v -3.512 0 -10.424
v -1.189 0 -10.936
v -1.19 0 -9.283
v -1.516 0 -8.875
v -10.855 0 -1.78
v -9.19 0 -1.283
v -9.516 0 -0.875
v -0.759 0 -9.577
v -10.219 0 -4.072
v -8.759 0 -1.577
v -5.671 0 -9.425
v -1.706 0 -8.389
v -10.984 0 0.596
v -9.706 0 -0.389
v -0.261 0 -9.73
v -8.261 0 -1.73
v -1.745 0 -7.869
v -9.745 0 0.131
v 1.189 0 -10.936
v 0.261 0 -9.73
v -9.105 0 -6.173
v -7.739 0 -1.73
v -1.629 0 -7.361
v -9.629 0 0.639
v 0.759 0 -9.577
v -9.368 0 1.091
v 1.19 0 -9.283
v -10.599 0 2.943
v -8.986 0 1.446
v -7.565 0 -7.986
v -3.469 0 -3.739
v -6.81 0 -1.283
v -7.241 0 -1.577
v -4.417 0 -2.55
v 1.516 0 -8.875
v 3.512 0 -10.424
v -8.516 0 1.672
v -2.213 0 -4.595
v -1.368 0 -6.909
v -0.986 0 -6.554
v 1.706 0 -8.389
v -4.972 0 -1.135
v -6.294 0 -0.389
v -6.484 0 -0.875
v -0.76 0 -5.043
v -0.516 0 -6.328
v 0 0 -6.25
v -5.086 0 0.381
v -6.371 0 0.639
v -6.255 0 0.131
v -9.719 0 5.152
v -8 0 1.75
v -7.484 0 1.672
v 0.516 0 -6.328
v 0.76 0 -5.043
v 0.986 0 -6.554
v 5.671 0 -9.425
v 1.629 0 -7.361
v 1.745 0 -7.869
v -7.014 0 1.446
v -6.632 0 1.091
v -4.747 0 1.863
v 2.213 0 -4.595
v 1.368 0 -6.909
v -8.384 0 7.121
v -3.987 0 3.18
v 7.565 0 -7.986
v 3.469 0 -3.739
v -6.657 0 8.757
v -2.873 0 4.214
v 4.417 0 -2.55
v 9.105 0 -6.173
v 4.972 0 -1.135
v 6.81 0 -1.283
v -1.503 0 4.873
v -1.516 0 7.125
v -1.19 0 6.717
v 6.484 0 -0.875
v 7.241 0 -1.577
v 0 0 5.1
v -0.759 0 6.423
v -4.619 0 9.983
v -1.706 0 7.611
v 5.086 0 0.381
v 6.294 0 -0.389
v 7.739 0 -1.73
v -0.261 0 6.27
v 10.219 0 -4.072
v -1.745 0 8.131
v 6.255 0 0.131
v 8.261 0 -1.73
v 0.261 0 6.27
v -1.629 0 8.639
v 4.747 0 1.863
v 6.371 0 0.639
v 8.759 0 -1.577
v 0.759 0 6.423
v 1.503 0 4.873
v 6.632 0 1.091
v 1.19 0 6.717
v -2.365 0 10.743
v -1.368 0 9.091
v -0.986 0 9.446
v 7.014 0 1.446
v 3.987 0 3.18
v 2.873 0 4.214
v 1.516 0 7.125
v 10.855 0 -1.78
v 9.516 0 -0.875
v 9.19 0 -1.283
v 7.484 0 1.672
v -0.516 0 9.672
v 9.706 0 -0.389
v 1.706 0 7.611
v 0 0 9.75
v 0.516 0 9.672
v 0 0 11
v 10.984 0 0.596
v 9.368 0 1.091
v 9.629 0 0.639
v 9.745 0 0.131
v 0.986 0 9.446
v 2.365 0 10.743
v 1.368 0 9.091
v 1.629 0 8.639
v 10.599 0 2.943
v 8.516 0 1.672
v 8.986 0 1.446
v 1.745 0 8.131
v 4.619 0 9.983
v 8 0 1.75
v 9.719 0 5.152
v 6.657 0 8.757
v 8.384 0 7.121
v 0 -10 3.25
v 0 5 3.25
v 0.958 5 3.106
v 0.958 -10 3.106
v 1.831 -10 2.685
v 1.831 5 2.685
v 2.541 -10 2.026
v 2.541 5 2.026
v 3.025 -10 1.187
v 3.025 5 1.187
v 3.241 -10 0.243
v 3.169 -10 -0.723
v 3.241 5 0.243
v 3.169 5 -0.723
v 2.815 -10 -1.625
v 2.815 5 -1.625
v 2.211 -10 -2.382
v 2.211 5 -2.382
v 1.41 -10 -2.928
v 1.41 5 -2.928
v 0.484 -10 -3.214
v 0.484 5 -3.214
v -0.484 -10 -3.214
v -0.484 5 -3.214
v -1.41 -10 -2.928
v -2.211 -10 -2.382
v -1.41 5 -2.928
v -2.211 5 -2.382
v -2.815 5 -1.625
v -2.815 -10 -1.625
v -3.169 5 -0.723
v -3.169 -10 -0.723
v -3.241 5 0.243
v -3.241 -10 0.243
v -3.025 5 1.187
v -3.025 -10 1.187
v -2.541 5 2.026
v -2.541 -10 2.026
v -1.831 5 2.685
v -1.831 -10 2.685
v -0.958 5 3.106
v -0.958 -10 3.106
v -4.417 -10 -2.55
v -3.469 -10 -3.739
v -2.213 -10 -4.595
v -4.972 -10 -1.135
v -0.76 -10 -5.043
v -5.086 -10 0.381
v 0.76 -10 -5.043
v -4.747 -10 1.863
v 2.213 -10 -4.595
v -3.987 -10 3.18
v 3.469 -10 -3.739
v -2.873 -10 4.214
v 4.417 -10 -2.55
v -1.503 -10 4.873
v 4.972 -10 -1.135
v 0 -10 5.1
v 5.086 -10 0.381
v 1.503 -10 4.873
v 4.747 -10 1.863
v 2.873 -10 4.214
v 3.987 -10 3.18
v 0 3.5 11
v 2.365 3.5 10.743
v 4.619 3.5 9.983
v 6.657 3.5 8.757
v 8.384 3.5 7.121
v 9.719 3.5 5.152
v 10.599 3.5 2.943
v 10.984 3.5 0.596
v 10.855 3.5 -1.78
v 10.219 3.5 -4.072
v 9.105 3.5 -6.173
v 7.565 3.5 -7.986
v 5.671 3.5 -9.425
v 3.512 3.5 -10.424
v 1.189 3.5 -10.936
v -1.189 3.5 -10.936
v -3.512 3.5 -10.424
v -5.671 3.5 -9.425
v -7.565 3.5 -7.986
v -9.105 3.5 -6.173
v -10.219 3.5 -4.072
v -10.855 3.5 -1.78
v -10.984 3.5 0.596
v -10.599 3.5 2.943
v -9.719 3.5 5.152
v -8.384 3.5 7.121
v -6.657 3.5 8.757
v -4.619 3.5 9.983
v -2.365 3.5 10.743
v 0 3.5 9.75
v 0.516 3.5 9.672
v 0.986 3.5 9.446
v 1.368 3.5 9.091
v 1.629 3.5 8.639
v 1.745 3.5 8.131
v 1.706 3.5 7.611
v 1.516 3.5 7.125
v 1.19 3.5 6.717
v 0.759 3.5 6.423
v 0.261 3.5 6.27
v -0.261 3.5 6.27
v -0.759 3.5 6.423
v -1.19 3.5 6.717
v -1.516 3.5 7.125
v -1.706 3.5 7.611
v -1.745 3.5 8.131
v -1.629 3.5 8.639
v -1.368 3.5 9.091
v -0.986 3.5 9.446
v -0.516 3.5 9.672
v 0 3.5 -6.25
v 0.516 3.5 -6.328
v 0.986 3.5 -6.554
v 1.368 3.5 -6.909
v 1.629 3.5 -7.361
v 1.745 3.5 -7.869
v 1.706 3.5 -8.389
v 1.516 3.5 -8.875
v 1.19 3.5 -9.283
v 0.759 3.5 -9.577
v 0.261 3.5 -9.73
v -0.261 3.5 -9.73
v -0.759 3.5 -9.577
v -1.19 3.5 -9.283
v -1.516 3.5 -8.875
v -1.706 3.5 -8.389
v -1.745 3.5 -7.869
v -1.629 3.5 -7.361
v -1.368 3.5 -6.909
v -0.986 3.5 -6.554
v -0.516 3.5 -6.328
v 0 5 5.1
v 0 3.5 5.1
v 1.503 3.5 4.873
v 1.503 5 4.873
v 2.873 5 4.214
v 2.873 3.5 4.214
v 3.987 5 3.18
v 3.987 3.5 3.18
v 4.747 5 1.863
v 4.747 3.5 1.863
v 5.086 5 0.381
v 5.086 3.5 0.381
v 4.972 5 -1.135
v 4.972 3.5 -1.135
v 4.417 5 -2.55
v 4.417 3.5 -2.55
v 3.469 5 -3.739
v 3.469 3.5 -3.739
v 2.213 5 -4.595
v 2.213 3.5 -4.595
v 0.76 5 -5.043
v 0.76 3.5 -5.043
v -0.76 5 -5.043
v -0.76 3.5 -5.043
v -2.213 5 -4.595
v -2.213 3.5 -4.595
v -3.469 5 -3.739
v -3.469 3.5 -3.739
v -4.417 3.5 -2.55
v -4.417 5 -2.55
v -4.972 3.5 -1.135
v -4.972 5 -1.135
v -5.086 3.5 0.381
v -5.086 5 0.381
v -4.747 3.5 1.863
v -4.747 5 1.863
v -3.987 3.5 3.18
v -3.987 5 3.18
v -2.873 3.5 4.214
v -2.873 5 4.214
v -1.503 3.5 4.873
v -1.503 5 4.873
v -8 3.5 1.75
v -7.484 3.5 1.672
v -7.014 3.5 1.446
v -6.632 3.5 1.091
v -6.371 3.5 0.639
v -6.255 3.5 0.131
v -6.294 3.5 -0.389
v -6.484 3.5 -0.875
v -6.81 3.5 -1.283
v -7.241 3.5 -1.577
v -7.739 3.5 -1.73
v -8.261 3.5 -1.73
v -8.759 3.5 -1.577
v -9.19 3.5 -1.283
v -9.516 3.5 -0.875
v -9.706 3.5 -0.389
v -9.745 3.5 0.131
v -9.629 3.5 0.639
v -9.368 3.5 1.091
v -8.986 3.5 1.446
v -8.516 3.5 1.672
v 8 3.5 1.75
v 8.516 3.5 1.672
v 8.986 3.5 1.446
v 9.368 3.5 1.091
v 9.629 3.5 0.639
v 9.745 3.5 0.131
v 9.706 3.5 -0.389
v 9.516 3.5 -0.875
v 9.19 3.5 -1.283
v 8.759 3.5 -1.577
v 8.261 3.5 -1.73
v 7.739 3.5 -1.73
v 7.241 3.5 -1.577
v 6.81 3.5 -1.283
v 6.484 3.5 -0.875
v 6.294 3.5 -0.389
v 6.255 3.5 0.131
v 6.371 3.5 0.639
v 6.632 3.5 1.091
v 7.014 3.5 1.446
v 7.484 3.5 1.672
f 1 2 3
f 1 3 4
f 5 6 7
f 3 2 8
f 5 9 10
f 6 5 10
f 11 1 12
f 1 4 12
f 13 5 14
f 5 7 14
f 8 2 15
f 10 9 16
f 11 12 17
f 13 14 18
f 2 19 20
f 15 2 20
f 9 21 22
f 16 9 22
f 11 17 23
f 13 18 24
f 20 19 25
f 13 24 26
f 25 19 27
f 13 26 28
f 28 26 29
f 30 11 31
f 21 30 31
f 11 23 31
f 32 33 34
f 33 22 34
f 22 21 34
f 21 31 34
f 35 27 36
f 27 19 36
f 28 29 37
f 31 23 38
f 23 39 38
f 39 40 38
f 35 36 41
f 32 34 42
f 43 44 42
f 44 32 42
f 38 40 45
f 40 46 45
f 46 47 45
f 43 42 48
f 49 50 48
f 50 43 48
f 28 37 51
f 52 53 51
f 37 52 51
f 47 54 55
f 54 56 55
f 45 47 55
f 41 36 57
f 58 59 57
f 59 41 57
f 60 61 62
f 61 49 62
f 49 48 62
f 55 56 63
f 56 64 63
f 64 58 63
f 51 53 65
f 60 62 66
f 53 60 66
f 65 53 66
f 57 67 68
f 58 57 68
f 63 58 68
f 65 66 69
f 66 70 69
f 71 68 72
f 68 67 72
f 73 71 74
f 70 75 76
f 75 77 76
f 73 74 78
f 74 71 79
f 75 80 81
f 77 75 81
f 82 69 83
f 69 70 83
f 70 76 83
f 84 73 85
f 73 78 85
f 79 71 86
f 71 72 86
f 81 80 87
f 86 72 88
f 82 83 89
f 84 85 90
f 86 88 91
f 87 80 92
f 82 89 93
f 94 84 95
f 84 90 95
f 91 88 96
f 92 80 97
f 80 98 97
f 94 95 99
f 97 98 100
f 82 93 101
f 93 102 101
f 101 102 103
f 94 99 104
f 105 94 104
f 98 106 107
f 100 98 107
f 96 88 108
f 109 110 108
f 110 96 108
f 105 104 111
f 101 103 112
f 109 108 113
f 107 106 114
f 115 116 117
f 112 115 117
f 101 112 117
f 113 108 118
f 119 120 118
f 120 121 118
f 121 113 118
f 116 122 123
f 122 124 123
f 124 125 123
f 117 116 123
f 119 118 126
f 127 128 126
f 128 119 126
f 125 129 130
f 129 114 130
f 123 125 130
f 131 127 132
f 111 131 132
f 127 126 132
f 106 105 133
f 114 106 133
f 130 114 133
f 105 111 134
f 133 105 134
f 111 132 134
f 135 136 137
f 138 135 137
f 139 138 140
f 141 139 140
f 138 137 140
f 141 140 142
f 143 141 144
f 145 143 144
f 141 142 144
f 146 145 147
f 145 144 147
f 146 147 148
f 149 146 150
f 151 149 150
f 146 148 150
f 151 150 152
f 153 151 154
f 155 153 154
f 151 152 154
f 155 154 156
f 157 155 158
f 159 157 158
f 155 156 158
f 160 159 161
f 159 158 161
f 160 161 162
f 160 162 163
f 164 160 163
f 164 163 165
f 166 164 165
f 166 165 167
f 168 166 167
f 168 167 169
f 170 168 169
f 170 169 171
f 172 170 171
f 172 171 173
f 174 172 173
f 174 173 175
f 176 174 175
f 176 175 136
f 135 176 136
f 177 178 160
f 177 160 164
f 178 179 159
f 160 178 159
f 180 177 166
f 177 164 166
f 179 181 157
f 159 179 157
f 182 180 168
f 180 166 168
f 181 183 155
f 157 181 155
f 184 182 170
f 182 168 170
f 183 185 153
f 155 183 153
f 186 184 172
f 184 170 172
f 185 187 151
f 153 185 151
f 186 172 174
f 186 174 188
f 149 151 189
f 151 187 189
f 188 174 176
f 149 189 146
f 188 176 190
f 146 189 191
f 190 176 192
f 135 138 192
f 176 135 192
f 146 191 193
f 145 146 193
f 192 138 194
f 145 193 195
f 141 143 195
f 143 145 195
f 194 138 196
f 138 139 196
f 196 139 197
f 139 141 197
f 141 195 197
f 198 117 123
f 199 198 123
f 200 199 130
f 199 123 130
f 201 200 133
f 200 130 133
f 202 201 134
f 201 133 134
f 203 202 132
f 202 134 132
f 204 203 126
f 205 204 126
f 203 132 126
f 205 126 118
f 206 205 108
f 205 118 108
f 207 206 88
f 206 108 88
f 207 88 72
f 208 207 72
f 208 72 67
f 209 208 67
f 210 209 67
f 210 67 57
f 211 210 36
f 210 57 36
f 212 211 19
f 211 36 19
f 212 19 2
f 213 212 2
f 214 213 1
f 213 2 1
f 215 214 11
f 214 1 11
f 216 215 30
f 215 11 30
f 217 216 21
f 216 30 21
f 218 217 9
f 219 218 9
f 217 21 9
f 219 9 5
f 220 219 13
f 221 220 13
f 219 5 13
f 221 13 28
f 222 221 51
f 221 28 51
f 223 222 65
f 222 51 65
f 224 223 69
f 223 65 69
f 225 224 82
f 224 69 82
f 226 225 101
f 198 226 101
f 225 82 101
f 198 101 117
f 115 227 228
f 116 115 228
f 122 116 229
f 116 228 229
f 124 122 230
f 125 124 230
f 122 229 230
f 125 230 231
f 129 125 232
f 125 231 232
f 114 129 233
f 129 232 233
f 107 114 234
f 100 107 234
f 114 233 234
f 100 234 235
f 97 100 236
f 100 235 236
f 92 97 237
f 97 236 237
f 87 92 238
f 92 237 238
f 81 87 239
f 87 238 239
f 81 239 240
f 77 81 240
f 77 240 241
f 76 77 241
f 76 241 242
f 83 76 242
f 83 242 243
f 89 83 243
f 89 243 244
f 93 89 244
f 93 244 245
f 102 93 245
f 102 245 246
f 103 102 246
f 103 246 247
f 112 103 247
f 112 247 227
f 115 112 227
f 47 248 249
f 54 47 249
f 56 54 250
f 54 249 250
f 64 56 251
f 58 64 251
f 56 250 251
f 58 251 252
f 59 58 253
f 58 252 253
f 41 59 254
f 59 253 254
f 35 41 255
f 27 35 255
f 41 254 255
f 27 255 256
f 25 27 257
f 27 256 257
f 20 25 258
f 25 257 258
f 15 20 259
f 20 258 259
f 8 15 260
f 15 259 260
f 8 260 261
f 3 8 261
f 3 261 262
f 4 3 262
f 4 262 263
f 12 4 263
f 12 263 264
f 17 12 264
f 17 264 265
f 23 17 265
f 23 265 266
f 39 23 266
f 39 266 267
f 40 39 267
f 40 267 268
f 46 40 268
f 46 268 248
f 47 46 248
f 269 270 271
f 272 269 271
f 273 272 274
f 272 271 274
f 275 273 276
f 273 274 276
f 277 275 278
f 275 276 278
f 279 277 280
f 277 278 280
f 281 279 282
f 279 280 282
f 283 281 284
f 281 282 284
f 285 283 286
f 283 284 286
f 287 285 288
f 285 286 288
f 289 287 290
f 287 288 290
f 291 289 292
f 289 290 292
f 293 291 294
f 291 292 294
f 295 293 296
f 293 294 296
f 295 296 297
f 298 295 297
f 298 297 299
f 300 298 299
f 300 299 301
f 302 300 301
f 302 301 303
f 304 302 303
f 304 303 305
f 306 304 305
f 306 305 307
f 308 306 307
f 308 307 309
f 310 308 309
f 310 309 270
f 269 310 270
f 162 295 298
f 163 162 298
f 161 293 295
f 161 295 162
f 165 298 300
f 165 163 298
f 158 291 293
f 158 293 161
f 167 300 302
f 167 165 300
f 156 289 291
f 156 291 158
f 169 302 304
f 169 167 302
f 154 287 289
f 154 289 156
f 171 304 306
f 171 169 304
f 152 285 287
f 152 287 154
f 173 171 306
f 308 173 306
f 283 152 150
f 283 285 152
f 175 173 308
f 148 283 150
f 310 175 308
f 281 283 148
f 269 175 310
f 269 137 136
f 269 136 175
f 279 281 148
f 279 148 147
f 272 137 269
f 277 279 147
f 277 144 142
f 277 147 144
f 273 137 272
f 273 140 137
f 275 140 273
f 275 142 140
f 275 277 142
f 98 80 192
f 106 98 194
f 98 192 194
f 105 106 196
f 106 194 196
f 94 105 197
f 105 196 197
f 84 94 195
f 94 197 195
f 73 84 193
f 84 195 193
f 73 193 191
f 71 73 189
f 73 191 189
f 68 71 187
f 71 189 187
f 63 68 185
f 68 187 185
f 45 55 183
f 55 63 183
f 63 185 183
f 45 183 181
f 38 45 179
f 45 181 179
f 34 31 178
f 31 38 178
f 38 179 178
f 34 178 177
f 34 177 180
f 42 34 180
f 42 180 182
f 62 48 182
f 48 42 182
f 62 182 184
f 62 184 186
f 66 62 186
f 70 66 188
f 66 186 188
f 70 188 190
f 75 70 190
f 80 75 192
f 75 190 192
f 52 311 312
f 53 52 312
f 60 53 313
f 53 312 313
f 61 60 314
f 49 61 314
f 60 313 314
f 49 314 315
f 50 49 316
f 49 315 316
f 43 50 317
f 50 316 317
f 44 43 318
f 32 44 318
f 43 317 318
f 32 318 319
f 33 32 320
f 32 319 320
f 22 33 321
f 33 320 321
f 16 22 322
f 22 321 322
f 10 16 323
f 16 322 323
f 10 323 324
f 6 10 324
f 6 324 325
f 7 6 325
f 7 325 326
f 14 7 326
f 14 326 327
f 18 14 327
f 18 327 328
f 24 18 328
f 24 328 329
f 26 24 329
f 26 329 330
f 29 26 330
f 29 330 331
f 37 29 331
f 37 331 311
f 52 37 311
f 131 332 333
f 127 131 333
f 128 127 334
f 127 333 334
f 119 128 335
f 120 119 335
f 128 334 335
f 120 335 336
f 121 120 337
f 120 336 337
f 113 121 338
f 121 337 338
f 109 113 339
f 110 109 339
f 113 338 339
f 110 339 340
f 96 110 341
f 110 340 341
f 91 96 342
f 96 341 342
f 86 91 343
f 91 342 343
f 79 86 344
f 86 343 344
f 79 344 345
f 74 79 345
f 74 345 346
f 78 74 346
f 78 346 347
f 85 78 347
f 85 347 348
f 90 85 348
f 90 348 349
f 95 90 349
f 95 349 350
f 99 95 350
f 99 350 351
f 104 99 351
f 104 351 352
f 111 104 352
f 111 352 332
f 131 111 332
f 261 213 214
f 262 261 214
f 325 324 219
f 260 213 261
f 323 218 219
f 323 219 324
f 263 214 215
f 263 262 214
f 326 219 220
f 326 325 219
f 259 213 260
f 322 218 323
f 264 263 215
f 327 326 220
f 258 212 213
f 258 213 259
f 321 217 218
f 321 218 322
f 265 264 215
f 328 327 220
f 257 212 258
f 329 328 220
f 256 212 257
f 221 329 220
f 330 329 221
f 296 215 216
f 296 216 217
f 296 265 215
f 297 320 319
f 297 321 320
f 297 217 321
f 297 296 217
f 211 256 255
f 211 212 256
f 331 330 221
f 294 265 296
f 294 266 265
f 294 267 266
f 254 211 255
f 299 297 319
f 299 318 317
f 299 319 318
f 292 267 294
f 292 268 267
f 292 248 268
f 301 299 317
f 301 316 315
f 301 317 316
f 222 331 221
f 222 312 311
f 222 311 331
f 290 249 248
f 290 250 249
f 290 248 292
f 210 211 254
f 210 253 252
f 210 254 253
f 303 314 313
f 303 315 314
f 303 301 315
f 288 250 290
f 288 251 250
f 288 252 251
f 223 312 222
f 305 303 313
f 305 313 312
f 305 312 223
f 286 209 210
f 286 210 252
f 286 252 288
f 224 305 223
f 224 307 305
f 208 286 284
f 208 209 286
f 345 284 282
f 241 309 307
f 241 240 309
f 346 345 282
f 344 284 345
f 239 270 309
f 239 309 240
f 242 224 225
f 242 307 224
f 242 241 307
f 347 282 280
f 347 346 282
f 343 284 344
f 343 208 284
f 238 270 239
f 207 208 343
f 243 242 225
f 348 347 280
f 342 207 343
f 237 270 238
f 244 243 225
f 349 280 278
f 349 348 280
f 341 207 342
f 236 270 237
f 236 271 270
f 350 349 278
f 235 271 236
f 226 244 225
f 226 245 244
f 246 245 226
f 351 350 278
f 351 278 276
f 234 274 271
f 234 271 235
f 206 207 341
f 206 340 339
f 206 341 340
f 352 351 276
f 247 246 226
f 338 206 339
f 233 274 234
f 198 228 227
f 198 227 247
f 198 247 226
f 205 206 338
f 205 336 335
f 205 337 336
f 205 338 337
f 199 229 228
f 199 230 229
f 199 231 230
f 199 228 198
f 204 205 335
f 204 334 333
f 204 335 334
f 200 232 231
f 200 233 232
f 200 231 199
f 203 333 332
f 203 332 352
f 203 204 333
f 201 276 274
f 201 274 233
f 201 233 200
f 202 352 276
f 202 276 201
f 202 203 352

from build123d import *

# Parameters (mm, degrees)
SKETCH1_R                = 11
BOSS_EXTRUDE1_DEPTH      = 3.5
BOSS_EXTRUDE2_DEPTH      = 1.5
BOSS_EXTRUDE2_DEPTH_BACK = 13.5
SKETCH2_R                = 5.1
SKETCH3_R                = 3.25
CUT_EXTRUDE1_DEPTH       = 22.610182785
SKETCH4_R                = 1.75
CUT_EXTRUDE2_DEPTH       = 21.597329924


with BuildPart() as part:
    # Sketch1 → Boss-Extrude1 (new body)
    with BuildSketch(Plane(origin=(0, 0, 0), x_dir=(1, 0, 0), z_dir=(0, 1, 0))):
        with Locations(Location((0, 0, 0), (0, 0, 270))):
            Circle(SKETCH1_R)
    extrude(amount=BOSS_EXTRUDE1_DEPTH)

    # Sketch2 → Boss-Extrude2 (add, two sides: drawn at the far end of the back side and taken through both)
    with BuildSketch(Plane(origin=(0, 3.5, 0), x_dir=(1, 0, 0), z_dir=(0, 1, 0)).offset(-BOSS_EXTRUDE2_DEPTH_BACK)):
        with Locations(Location((0, 0, 0), (0, 0, 270))):
            Circle(SKETCH2_R)
    extrude(amount=BOSS_EXTRUDE2_DEPTH + BOSS_EXTRUDE2_DEPTH_BACK)

    # Sketch3 → Cut-Extrude1 (cut, through all)
    with BuildSketch(Plane(origin=(0, 5, 0), x_dir=(1, 0, 0), z_dir=(0, 1, 0))):
        with Locations(Location((0, 0, 0), (0, 0, 270))):
            Circle(SKETCH3_R)
    extrude(amount=-CUT_EXTRUDE1_DEPTH, mode=Mode.SUBTRACT)

    # Sketch4 → Cut-Extrude2 (cut, through all)
    with BuildSketch(Plane(origin=(0, 3.5, 0), x_dir=(1, 0, 0), z_dir=(0, 1, 0))):
        with Locations(Location((-8, 0, 0), (0, 0, 270))):
            Circle(SKETCH4_R)
        with Locations(Location((0, 8, 0), (0, 0, 270))):
            Circle(SKETCH4_R)
        with Locations(Location((8, 0, 0), (0, 0, 270))):
            Circle(SKETCH4_R)
        with Locations(Location((0, -8, 0), (0, 0, 270))):
            Circle(SKETCH4_R)
    extrude(amount=-CUT_EXTRUDE2_DEPTH, mode=Mode.SUBTRACT)


solid = part.part
